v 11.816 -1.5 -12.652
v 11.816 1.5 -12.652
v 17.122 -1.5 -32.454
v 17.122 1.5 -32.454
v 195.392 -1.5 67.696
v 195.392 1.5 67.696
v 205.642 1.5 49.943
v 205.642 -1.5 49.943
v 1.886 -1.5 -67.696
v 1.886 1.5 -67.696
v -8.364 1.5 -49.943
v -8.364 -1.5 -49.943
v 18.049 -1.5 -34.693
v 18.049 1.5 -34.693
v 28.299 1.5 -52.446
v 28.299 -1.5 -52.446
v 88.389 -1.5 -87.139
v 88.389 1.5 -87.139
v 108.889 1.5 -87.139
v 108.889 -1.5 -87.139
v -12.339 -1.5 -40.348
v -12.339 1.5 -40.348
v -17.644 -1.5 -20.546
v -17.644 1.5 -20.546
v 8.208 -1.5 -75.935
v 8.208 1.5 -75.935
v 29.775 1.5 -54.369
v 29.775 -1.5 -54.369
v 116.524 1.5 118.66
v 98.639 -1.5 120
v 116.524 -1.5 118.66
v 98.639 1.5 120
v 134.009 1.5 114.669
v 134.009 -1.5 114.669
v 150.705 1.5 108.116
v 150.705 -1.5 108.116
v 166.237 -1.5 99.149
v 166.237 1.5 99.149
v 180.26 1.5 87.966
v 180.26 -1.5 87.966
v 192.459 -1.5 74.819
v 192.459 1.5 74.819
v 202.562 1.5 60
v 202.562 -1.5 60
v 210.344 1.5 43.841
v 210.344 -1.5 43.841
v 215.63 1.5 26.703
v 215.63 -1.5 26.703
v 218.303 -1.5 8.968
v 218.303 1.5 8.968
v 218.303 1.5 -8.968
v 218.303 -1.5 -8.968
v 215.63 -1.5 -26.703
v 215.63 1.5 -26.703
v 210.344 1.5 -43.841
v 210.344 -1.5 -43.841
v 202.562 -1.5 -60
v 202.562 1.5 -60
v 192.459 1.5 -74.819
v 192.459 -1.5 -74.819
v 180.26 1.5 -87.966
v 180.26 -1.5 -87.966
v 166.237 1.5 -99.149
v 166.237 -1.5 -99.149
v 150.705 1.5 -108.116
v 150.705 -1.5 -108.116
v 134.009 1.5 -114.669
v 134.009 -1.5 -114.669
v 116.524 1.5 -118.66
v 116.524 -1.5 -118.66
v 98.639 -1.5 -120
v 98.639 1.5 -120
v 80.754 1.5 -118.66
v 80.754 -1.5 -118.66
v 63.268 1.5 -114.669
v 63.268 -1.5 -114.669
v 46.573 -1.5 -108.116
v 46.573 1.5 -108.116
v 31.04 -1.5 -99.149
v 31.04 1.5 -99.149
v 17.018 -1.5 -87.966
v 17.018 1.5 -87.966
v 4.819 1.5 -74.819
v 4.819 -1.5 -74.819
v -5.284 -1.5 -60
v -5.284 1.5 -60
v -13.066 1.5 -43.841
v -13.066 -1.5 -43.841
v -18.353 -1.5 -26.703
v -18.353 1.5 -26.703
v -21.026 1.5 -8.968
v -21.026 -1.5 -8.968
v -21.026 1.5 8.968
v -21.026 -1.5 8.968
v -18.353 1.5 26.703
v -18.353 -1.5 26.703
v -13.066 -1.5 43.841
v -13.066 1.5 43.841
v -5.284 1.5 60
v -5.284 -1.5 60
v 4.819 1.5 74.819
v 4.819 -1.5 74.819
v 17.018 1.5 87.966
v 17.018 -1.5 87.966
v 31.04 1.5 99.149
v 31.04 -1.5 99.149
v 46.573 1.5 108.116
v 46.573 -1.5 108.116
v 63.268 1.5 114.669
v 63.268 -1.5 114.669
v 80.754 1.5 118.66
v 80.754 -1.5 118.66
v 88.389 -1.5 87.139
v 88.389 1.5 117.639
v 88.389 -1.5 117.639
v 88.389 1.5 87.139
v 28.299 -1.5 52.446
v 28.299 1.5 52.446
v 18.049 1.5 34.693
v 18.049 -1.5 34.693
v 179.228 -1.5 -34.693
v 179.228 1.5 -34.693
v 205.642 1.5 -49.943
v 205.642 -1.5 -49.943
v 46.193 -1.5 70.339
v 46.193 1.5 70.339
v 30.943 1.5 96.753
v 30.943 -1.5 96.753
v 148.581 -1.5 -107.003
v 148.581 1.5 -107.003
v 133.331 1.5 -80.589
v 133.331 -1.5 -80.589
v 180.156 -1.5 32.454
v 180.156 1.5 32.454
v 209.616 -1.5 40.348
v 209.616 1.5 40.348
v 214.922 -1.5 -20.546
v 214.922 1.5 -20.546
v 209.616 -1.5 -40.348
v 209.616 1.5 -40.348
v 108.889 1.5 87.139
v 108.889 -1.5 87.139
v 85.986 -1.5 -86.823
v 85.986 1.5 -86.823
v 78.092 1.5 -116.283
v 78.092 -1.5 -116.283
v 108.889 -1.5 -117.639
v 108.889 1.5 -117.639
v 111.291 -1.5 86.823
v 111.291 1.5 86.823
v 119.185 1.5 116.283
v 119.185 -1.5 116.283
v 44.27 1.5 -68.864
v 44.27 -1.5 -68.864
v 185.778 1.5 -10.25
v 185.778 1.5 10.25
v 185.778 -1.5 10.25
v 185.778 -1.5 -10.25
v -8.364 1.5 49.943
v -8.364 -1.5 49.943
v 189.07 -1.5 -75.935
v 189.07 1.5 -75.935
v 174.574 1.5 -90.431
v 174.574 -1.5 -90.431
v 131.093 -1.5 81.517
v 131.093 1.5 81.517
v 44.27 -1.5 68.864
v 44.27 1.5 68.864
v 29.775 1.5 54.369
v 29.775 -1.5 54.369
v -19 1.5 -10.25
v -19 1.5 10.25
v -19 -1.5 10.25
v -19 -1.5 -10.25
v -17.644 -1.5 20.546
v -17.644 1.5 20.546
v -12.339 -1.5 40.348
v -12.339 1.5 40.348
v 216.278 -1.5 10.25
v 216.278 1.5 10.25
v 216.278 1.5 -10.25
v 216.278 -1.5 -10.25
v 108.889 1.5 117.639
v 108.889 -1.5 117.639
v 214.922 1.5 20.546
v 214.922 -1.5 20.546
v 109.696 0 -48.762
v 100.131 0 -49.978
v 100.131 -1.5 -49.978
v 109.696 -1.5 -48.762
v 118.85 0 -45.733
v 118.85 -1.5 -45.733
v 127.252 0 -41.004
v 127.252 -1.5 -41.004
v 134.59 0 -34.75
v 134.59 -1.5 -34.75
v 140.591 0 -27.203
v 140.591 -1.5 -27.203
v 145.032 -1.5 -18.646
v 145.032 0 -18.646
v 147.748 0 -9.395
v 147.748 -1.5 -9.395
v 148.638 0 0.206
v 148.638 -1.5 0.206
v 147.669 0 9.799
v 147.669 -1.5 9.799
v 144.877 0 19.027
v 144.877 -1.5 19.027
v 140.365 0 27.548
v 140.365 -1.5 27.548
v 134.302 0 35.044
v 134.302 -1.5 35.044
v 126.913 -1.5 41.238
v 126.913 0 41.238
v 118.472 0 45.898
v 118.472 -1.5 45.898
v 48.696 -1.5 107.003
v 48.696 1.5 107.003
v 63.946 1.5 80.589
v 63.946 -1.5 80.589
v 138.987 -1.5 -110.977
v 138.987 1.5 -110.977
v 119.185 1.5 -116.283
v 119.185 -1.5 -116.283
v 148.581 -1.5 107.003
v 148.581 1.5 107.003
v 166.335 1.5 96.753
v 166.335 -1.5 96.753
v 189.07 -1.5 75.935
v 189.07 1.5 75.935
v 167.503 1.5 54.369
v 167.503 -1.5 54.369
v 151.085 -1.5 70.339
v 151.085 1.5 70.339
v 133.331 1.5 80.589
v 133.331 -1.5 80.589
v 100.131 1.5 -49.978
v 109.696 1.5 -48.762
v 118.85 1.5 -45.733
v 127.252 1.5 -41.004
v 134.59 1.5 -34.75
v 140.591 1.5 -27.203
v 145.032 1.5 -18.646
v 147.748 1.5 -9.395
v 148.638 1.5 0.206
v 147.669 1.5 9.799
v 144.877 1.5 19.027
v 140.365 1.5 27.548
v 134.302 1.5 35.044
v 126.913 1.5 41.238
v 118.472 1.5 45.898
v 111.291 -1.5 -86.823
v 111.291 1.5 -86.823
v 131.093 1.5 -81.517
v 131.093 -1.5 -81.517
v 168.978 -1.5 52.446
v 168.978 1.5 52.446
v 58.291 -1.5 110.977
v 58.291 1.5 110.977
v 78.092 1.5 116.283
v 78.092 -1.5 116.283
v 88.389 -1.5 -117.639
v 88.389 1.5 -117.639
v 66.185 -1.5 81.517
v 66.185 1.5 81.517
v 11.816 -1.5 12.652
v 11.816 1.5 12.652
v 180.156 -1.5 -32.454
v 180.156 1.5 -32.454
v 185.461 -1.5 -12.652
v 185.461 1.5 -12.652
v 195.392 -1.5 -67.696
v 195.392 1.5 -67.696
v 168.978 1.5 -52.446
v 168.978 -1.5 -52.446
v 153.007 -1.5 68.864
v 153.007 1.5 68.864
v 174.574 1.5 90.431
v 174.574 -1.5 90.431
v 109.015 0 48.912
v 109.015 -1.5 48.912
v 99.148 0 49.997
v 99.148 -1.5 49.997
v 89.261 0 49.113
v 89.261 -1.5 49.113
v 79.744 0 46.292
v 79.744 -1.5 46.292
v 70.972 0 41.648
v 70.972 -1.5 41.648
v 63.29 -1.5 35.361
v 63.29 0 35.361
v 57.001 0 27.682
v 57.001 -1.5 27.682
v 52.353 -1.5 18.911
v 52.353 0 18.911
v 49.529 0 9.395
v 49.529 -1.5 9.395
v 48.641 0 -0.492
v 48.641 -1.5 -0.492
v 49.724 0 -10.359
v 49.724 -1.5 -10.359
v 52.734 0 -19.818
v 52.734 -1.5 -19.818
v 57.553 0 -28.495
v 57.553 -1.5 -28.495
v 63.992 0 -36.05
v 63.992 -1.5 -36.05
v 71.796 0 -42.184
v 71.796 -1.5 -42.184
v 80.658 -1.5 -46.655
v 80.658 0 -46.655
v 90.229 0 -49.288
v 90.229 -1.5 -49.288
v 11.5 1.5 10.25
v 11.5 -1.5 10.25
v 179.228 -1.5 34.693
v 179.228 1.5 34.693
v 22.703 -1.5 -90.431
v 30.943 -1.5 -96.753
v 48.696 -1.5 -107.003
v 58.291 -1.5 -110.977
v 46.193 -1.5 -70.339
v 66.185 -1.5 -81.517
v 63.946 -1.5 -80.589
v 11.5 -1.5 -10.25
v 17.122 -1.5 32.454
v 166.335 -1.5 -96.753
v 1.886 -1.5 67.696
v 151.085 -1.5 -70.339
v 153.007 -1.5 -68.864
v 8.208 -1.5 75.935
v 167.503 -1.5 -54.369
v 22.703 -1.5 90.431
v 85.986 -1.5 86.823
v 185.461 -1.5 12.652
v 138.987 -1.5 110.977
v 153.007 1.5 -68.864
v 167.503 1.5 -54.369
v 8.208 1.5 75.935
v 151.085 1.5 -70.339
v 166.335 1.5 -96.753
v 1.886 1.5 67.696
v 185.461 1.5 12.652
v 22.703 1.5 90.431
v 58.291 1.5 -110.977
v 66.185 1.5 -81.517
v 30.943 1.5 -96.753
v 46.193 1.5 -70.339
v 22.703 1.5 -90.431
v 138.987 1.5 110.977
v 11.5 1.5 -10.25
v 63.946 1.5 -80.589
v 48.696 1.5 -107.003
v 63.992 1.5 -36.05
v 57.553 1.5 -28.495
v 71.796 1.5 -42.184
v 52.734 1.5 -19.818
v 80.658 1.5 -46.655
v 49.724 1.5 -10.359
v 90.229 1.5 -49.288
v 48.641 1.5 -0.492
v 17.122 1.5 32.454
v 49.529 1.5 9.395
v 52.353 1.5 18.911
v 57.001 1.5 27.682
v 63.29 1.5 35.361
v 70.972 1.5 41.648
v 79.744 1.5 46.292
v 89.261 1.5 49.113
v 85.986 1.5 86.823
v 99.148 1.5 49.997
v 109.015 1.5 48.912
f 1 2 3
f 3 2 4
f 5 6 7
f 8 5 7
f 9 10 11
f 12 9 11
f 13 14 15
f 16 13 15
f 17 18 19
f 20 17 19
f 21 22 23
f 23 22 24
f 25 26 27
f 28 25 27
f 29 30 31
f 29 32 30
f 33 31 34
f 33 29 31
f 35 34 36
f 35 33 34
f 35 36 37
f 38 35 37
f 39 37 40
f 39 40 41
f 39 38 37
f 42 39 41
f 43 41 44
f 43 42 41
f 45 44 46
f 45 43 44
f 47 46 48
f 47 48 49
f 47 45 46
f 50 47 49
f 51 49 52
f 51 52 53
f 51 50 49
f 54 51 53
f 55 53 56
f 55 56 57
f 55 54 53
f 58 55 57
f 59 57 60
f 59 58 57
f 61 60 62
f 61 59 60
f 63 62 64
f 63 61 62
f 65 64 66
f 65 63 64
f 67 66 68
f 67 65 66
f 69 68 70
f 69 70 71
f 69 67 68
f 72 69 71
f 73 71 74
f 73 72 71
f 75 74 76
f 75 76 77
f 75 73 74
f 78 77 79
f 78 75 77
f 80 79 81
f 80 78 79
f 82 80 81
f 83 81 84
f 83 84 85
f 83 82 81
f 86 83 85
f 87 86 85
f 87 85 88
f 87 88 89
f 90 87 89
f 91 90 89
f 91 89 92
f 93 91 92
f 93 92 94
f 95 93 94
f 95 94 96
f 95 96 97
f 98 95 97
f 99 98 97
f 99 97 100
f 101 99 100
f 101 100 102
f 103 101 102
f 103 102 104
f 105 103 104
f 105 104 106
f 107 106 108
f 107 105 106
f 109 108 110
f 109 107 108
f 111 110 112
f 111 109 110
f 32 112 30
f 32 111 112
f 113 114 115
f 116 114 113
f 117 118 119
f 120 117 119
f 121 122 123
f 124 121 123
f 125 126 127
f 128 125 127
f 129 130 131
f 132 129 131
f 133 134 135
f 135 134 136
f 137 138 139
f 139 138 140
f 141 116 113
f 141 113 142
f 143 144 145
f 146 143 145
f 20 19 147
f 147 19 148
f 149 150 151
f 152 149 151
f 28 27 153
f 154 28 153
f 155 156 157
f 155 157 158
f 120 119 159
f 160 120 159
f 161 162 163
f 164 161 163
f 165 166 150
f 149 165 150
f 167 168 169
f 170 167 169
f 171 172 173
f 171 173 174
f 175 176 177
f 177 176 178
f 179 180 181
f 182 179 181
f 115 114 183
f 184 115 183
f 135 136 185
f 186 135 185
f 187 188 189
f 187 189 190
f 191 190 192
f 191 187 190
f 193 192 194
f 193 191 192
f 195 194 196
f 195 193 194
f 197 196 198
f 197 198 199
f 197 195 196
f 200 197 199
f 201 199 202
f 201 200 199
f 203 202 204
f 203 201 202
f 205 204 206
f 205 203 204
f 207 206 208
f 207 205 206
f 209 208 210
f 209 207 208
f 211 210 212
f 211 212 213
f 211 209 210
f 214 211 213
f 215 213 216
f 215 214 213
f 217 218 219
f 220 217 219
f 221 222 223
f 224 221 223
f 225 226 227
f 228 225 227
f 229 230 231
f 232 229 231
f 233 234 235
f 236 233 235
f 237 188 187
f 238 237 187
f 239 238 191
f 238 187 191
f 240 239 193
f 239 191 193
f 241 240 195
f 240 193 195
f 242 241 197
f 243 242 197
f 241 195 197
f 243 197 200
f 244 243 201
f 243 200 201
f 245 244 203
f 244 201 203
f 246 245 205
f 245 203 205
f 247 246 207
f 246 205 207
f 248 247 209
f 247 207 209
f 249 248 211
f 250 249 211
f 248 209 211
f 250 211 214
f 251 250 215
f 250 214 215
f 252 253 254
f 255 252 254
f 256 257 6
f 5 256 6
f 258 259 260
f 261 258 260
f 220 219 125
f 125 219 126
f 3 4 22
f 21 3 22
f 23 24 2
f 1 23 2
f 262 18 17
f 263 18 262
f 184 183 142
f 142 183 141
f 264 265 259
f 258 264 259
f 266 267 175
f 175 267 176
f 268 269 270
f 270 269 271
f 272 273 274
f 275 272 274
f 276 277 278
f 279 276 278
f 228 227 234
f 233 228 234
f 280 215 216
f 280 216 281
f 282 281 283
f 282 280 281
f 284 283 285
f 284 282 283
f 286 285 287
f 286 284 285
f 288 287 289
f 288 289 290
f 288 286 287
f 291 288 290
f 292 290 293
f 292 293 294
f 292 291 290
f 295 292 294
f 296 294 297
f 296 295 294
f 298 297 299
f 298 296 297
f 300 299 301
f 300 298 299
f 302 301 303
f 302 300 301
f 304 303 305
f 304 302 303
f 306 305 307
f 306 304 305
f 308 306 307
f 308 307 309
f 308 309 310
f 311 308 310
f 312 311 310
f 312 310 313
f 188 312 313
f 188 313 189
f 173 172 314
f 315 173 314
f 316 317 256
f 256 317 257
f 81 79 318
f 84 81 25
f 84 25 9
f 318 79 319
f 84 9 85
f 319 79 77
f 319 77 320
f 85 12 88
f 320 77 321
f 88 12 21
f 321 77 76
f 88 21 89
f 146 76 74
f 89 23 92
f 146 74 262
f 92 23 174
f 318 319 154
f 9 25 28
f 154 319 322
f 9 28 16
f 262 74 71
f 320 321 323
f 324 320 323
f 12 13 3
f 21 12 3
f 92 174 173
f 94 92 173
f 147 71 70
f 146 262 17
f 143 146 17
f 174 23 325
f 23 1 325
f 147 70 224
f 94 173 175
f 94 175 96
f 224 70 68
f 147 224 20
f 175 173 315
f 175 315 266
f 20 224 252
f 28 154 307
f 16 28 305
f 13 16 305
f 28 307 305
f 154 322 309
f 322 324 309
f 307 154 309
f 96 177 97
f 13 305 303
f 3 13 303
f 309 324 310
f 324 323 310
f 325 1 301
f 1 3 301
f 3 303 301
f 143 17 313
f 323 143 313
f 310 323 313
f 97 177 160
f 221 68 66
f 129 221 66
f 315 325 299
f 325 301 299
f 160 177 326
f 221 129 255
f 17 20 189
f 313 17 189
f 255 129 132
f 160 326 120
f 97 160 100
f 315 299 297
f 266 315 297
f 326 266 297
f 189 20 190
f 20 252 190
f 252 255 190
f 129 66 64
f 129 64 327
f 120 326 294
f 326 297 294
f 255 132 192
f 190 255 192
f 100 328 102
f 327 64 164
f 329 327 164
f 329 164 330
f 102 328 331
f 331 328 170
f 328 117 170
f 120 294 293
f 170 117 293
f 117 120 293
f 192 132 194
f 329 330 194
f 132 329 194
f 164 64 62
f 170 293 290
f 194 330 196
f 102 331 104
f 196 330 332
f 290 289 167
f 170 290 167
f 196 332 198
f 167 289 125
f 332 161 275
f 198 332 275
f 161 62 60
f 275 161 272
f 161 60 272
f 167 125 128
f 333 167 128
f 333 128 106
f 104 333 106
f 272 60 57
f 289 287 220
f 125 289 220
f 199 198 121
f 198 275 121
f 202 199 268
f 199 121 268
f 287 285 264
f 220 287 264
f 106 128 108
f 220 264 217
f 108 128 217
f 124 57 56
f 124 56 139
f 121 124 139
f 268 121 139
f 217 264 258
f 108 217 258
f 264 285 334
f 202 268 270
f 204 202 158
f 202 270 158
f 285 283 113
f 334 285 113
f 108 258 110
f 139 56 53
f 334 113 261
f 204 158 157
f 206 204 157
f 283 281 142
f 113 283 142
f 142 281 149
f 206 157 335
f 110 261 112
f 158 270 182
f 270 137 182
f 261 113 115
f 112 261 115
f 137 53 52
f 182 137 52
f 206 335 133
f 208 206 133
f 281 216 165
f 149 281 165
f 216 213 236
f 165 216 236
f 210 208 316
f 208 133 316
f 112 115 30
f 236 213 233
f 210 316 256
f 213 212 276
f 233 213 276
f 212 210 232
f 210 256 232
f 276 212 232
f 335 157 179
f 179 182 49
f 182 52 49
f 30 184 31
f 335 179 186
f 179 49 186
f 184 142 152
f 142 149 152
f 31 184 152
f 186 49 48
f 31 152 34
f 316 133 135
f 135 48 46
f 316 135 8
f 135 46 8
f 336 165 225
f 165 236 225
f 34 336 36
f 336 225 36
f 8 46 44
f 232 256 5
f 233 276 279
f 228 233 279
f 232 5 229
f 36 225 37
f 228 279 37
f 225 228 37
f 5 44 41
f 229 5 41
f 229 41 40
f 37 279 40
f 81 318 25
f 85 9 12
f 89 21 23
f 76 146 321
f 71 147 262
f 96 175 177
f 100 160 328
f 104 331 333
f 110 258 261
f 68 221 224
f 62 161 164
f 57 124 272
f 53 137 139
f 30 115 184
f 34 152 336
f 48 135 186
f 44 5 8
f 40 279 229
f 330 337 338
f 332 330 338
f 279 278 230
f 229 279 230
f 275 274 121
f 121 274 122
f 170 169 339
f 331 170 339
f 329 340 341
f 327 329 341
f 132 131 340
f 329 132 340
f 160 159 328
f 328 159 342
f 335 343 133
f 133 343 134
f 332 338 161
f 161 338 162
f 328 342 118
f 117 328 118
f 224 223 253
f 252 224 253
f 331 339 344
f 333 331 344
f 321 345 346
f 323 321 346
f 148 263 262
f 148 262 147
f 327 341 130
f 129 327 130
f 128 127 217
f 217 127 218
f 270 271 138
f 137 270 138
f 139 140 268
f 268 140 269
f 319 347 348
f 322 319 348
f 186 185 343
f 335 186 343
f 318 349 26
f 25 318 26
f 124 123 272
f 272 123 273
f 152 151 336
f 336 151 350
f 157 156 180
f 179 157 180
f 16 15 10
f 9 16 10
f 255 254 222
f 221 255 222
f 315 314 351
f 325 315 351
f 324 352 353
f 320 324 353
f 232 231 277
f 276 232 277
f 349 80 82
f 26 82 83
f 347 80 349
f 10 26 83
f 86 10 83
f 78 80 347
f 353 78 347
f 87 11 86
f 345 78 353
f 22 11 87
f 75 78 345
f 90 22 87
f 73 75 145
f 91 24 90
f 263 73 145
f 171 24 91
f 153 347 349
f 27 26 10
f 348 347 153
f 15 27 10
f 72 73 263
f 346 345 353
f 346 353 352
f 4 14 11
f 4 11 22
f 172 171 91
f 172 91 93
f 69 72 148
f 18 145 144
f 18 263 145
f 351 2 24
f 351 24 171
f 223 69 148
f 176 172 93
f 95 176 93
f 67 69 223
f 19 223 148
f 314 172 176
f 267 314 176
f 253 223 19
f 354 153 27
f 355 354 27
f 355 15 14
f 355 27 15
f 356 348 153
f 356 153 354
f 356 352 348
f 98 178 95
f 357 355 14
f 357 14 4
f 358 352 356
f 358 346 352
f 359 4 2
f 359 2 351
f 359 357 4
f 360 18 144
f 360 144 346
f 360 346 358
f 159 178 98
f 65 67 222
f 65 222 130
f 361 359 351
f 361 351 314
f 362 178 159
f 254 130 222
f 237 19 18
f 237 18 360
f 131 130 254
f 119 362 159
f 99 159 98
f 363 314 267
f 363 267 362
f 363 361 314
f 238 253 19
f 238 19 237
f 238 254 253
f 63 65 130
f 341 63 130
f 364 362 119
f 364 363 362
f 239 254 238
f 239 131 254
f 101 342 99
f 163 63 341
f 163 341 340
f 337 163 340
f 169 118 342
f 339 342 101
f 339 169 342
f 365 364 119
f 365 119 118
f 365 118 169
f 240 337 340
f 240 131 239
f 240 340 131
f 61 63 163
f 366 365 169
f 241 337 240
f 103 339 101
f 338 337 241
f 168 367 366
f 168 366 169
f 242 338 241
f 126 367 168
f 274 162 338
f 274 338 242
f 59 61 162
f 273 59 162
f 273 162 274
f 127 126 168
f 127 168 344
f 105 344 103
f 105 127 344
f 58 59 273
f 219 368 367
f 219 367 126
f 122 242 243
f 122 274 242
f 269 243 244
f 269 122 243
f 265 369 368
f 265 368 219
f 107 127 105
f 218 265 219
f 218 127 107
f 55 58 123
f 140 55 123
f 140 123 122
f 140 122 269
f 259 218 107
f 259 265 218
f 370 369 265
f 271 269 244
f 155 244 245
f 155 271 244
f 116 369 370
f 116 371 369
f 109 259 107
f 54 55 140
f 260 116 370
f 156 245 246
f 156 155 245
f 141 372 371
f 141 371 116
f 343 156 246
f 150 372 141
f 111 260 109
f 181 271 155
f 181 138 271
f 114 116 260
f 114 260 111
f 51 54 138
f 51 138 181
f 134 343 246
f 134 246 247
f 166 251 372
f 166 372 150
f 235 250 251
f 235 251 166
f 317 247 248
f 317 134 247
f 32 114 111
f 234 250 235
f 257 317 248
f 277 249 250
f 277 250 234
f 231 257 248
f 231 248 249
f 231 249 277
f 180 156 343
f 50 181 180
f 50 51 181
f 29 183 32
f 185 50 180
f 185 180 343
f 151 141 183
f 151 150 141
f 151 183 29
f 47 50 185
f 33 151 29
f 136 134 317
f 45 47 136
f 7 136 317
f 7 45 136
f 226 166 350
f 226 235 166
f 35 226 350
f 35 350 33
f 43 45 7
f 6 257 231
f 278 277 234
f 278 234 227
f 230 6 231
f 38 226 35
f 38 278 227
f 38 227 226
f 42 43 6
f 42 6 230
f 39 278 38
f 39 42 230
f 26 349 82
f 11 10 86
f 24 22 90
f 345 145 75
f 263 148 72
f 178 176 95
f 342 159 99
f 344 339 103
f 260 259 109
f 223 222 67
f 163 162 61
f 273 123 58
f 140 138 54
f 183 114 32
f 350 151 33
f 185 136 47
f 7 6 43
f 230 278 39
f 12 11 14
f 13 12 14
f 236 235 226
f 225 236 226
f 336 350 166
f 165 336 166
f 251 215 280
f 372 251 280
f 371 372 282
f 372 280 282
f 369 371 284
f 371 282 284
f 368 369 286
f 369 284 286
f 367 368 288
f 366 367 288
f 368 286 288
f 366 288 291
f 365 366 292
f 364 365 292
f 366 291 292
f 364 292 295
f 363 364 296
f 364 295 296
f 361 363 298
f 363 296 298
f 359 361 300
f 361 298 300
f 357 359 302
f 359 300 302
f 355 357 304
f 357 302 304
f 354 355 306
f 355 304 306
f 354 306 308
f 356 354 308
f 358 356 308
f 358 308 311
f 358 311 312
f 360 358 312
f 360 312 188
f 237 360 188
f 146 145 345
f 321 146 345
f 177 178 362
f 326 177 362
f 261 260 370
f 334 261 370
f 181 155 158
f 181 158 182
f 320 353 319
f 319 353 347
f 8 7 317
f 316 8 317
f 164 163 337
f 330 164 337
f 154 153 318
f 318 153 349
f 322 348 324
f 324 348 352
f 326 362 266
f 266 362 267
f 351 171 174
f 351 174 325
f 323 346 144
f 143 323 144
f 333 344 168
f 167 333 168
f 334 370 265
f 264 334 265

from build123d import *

# Parameters (mm, degrees)
SKETCH1_R           = 120
BOSS_EXTRUDE1_DEPTH = 1.5
SKETCH6_W           = 30.5
SKETCH6_H           = 20.5
SKETCH6_W_2         = 20.5
SKETCH6_H_2         = 30.5
CUT_EXTRUDE1_DEPTH  = 10.5


with BuildPart() as part:
    # Sketch1 → Boss-Extrude1 (new, symmetric)
    with BuildSketch(Plane(origin=(0, 0, 0), x_dir=(1, 0, 0), z_dir=(0, 1, 0))):
        with Locations(Location((98.638798209, 0, 0), (0, 0, 270))):
            Circle(SKETCH1_R)
        with BuildLine():
            ThreePointArc((118.472374081, -45.898031201), (49.529315887, -9.394612605), (100.131404816, 49.97771629))
            ThreePointArc((100.131404816, 49.97771629), (147.748280532, 9.394612605), (118.472374081, -45.898031201))
        make_face(mode=Mode.SUBTRACT)
    extrude(amount=BOSS_EXTRUDE1_DEPTH, both=True)

    # Sketch6 → Cut-Extrude1 (cut)
    with BuildSketch(Plane(origin=(0, 1.5, 0), x_dir=(1, 0, 0), z_dir=(0, 1, 0))):
        with Locations((-3.75, 0)):
            Rectangle(SKETCH6_W, SKETCH6_H)
        Polygon((-12.338659942, 40.347901139), (-17.644450367, 20.5464217), (11.816287335, 12.652440824), (17.122077759, 32.453920263), align=None)
        Polygon((1.885610489, 67.696159493), (-8.364389511, 49.942638716), (18.049385305, 34.692638716), (28.299385305, 52.446159493), align=None)
        Polygon((22.703450772, 90.431036452), (8.207761758, 75.935347437), (29.774518584, 54.368590611), (44.270207598, 68.864279625), align=None)
        Polygon((48.696159493, 107.00318772), (30.942638716, 96.75318772), (46.192638716, 70.339412904), (63.946159493, 80.589412904), align=None)
        Polygon((78.092376509, 116.283248576), (58.29089707, 110.977458152), (66.184877946, 81.51672045), (85.986357385, 86.822510874), align=None)
        with Locations((98.638798209, 102.388798209)):
            Rectangle(SKETCH6_W_2, SKETCH6_H_2)
        Polygon((138.986699348, 110.977458152), (119.185219909, 116.283248576), (111.291239034, 86.822510874), (131.092718473, 81.51672045), align=None)
        Polygon((166.334957703, 96.75318772), (148.581436925, 107.00318772), (133.331436925, 80.589412904), (151.084957703, 70.339412904), align=None)
        Polygon((189.069834661, 75.935347437), (174.574145646, 90.431036452), (153.00738882, 68.864279625), (167.503077834, 54.368590611), align=None)
        Polygon((205.641985929, 49.942638716), (195.391985929, 67.696159493), (168.978211114, 52.446159493), (179.228211114, 34.692638716), align=None)
        Polygon((214.922046785, 20.5464217), (209.616256361, 40.347901139), (180.155518659, 32.453920263), (185.461309084, 12.652440824), align=None)
        with Locations((201.027596418, 0)):
            Rectangle(SKETCH6_W, SKETCH6_H)
        Polygon((209.616256361, -40.347901139), (214.922046785, -20.5464217), (185.461309084, -12.652440824), (180.155518659, -32.453920263), align=None)
        Polygon((195.391985929, -67.696159493), (205.641985929, -49.942638716), (179.228211114, -34.692638716), (168.978211114, -52.446159493), align=None)
        Polygon((174.574145646, -90.431036451), (189.069834661, -75.935347437), (167.503077835, -54.368590611), (153.00738882, -68.864279625), align=None)
        Polygon((148.581436925, -107.00318772), (166.334957703, -96.75318772), (151.084957703, -70.339412904), (133.331436925, -80.589412904), align=None)
        Polygon((119.185219909, -116.283248576), (138.986699348, -110.977458152), (131.092718473, -81.51672045), (111.291239034, -86.822510874), align=None)
        with Locations((98.638798209, -102.388798209)):
            Rectangle(SKETCH6_W_2, SKETCH6_H_2)
        Polygon((58.29089707, -110.977458152), (78.092376509, -116.283248576), (85.986357385, -86.822510874), (66.184877946, -81.51672045), align=None)
        Polygon((30.942638716, -96.75318772), (48.696159493, -107.00318772), (63.946159493, -80.589412904), (46.192638716, -70.339412904), align=None)
        Polygon((8.207761758, -75.935347437), (22.703450772, -90.431036452), (44.270207598, -68.864279625), (29.774518584, -54.368590611), align=None)
        Polygon((-8.364389511, -49.942638716), (1.885610489, -67.696159493), (28.299385305, -52.446159493), (18.049385305, -34.692638716), align=None)
        Polygon((-17.644450367, -20.5464217), (-12.338659942, -40.347901139), (17.122077759, -32.453920263), (11.816287335, -12.652440824), align=None)
    extrude(amount=-CUT_EXTRUDE1_DEPTH, mode=Mode.SUBTRACT)


solid = part.part
